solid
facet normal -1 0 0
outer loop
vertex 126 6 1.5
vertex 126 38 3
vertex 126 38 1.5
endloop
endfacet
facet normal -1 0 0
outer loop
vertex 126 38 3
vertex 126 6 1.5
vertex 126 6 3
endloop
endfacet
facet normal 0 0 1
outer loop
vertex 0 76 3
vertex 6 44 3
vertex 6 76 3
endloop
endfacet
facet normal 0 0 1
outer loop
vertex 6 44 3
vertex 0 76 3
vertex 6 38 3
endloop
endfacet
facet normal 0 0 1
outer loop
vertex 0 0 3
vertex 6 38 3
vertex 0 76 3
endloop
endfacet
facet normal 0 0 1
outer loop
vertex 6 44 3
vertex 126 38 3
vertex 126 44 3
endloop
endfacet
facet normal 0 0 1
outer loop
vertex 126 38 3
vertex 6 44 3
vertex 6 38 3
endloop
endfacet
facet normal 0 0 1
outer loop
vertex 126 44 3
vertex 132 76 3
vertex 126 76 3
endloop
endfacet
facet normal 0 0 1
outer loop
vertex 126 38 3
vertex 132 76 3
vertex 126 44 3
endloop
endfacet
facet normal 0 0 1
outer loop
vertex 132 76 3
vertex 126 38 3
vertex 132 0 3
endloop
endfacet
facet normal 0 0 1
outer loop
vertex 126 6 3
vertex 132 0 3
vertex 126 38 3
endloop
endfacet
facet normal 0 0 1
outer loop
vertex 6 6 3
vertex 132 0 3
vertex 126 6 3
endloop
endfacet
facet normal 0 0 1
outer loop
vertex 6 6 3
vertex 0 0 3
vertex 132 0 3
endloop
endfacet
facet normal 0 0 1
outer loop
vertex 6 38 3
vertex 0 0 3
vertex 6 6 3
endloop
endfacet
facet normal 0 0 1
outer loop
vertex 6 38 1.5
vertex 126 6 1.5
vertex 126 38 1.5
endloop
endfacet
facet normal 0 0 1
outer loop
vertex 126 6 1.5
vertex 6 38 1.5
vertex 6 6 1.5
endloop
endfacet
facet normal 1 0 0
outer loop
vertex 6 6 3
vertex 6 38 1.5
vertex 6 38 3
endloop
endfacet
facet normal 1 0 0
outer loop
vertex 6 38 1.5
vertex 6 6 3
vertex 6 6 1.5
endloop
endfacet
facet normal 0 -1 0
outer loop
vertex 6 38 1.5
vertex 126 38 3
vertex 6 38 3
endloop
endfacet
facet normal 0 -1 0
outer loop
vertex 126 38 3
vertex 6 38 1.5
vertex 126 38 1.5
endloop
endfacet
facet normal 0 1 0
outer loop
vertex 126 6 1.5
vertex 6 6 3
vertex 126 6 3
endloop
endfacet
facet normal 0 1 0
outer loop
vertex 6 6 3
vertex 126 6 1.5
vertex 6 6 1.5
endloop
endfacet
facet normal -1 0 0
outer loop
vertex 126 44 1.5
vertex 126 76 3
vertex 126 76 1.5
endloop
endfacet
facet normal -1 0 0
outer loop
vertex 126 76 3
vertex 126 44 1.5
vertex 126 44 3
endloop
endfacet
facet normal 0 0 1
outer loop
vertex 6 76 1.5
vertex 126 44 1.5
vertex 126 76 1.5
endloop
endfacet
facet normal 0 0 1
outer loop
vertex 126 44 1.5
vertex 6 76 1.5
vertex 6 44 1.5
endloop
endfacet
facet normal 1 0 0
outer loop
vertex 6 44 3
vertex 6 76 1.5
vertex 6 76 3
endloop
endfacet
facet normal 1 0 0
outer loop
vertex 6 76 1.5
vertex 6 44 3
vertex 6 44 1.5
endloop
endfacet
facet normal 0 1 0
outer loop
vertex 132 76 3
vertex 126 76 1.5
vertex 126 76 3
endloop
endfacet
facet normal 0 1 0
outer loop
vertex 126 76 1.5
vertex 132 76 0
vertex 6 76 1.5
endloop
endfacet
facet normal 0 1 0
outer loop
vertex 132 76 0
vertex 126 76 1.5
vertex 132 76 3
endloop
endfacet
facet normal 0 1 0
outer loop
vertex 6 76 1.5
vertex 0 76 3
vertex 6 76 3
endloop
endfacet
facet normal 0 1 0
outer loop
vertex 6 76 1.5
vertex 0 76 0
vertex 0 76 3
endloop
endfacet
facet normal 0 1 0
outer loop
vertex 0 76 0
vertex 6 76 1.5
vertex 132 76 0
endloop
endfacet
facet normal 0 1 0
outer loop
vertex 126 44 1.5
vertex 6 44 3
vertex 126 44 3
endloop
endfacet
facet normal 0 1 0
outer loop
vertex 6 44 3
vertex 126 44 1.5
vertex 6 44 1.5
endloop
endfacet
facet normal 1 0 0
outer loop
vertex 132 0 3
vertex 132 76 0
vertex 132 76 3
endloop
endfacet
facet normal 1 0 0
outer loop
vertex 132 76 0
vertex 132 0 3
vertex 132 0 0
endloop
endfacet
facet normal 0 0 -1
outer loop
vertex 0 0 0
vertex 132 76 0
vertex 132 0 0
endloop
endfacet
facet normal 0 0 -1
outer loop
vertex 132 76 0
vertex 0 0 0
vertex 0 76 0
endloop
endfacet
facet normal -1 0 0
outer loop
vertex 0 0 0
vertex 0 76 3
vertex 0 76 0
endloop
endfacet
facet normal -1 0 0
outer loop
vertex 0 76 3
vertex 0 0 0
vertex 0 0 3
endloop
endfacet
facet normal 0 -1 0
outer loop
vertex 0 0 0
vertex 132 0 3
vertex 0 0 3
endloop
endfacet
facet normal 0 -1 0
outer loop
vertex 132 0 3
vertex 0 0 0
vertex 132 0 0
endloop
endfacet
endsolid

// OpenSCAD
x=120;
y=64;
z1=3;
z2=1.5;
v=2;
r=2;
k=6;

module linjedrit() {
    translate([k,k,z2])
        cube([x,y/2,z2]);
    translate([k,k*2+y/2,z2])
        cube([x,y/2,z2]);
}

difference() {
    cube([x+k*2,y+k*2,z1]);
    linjedrit();
}
